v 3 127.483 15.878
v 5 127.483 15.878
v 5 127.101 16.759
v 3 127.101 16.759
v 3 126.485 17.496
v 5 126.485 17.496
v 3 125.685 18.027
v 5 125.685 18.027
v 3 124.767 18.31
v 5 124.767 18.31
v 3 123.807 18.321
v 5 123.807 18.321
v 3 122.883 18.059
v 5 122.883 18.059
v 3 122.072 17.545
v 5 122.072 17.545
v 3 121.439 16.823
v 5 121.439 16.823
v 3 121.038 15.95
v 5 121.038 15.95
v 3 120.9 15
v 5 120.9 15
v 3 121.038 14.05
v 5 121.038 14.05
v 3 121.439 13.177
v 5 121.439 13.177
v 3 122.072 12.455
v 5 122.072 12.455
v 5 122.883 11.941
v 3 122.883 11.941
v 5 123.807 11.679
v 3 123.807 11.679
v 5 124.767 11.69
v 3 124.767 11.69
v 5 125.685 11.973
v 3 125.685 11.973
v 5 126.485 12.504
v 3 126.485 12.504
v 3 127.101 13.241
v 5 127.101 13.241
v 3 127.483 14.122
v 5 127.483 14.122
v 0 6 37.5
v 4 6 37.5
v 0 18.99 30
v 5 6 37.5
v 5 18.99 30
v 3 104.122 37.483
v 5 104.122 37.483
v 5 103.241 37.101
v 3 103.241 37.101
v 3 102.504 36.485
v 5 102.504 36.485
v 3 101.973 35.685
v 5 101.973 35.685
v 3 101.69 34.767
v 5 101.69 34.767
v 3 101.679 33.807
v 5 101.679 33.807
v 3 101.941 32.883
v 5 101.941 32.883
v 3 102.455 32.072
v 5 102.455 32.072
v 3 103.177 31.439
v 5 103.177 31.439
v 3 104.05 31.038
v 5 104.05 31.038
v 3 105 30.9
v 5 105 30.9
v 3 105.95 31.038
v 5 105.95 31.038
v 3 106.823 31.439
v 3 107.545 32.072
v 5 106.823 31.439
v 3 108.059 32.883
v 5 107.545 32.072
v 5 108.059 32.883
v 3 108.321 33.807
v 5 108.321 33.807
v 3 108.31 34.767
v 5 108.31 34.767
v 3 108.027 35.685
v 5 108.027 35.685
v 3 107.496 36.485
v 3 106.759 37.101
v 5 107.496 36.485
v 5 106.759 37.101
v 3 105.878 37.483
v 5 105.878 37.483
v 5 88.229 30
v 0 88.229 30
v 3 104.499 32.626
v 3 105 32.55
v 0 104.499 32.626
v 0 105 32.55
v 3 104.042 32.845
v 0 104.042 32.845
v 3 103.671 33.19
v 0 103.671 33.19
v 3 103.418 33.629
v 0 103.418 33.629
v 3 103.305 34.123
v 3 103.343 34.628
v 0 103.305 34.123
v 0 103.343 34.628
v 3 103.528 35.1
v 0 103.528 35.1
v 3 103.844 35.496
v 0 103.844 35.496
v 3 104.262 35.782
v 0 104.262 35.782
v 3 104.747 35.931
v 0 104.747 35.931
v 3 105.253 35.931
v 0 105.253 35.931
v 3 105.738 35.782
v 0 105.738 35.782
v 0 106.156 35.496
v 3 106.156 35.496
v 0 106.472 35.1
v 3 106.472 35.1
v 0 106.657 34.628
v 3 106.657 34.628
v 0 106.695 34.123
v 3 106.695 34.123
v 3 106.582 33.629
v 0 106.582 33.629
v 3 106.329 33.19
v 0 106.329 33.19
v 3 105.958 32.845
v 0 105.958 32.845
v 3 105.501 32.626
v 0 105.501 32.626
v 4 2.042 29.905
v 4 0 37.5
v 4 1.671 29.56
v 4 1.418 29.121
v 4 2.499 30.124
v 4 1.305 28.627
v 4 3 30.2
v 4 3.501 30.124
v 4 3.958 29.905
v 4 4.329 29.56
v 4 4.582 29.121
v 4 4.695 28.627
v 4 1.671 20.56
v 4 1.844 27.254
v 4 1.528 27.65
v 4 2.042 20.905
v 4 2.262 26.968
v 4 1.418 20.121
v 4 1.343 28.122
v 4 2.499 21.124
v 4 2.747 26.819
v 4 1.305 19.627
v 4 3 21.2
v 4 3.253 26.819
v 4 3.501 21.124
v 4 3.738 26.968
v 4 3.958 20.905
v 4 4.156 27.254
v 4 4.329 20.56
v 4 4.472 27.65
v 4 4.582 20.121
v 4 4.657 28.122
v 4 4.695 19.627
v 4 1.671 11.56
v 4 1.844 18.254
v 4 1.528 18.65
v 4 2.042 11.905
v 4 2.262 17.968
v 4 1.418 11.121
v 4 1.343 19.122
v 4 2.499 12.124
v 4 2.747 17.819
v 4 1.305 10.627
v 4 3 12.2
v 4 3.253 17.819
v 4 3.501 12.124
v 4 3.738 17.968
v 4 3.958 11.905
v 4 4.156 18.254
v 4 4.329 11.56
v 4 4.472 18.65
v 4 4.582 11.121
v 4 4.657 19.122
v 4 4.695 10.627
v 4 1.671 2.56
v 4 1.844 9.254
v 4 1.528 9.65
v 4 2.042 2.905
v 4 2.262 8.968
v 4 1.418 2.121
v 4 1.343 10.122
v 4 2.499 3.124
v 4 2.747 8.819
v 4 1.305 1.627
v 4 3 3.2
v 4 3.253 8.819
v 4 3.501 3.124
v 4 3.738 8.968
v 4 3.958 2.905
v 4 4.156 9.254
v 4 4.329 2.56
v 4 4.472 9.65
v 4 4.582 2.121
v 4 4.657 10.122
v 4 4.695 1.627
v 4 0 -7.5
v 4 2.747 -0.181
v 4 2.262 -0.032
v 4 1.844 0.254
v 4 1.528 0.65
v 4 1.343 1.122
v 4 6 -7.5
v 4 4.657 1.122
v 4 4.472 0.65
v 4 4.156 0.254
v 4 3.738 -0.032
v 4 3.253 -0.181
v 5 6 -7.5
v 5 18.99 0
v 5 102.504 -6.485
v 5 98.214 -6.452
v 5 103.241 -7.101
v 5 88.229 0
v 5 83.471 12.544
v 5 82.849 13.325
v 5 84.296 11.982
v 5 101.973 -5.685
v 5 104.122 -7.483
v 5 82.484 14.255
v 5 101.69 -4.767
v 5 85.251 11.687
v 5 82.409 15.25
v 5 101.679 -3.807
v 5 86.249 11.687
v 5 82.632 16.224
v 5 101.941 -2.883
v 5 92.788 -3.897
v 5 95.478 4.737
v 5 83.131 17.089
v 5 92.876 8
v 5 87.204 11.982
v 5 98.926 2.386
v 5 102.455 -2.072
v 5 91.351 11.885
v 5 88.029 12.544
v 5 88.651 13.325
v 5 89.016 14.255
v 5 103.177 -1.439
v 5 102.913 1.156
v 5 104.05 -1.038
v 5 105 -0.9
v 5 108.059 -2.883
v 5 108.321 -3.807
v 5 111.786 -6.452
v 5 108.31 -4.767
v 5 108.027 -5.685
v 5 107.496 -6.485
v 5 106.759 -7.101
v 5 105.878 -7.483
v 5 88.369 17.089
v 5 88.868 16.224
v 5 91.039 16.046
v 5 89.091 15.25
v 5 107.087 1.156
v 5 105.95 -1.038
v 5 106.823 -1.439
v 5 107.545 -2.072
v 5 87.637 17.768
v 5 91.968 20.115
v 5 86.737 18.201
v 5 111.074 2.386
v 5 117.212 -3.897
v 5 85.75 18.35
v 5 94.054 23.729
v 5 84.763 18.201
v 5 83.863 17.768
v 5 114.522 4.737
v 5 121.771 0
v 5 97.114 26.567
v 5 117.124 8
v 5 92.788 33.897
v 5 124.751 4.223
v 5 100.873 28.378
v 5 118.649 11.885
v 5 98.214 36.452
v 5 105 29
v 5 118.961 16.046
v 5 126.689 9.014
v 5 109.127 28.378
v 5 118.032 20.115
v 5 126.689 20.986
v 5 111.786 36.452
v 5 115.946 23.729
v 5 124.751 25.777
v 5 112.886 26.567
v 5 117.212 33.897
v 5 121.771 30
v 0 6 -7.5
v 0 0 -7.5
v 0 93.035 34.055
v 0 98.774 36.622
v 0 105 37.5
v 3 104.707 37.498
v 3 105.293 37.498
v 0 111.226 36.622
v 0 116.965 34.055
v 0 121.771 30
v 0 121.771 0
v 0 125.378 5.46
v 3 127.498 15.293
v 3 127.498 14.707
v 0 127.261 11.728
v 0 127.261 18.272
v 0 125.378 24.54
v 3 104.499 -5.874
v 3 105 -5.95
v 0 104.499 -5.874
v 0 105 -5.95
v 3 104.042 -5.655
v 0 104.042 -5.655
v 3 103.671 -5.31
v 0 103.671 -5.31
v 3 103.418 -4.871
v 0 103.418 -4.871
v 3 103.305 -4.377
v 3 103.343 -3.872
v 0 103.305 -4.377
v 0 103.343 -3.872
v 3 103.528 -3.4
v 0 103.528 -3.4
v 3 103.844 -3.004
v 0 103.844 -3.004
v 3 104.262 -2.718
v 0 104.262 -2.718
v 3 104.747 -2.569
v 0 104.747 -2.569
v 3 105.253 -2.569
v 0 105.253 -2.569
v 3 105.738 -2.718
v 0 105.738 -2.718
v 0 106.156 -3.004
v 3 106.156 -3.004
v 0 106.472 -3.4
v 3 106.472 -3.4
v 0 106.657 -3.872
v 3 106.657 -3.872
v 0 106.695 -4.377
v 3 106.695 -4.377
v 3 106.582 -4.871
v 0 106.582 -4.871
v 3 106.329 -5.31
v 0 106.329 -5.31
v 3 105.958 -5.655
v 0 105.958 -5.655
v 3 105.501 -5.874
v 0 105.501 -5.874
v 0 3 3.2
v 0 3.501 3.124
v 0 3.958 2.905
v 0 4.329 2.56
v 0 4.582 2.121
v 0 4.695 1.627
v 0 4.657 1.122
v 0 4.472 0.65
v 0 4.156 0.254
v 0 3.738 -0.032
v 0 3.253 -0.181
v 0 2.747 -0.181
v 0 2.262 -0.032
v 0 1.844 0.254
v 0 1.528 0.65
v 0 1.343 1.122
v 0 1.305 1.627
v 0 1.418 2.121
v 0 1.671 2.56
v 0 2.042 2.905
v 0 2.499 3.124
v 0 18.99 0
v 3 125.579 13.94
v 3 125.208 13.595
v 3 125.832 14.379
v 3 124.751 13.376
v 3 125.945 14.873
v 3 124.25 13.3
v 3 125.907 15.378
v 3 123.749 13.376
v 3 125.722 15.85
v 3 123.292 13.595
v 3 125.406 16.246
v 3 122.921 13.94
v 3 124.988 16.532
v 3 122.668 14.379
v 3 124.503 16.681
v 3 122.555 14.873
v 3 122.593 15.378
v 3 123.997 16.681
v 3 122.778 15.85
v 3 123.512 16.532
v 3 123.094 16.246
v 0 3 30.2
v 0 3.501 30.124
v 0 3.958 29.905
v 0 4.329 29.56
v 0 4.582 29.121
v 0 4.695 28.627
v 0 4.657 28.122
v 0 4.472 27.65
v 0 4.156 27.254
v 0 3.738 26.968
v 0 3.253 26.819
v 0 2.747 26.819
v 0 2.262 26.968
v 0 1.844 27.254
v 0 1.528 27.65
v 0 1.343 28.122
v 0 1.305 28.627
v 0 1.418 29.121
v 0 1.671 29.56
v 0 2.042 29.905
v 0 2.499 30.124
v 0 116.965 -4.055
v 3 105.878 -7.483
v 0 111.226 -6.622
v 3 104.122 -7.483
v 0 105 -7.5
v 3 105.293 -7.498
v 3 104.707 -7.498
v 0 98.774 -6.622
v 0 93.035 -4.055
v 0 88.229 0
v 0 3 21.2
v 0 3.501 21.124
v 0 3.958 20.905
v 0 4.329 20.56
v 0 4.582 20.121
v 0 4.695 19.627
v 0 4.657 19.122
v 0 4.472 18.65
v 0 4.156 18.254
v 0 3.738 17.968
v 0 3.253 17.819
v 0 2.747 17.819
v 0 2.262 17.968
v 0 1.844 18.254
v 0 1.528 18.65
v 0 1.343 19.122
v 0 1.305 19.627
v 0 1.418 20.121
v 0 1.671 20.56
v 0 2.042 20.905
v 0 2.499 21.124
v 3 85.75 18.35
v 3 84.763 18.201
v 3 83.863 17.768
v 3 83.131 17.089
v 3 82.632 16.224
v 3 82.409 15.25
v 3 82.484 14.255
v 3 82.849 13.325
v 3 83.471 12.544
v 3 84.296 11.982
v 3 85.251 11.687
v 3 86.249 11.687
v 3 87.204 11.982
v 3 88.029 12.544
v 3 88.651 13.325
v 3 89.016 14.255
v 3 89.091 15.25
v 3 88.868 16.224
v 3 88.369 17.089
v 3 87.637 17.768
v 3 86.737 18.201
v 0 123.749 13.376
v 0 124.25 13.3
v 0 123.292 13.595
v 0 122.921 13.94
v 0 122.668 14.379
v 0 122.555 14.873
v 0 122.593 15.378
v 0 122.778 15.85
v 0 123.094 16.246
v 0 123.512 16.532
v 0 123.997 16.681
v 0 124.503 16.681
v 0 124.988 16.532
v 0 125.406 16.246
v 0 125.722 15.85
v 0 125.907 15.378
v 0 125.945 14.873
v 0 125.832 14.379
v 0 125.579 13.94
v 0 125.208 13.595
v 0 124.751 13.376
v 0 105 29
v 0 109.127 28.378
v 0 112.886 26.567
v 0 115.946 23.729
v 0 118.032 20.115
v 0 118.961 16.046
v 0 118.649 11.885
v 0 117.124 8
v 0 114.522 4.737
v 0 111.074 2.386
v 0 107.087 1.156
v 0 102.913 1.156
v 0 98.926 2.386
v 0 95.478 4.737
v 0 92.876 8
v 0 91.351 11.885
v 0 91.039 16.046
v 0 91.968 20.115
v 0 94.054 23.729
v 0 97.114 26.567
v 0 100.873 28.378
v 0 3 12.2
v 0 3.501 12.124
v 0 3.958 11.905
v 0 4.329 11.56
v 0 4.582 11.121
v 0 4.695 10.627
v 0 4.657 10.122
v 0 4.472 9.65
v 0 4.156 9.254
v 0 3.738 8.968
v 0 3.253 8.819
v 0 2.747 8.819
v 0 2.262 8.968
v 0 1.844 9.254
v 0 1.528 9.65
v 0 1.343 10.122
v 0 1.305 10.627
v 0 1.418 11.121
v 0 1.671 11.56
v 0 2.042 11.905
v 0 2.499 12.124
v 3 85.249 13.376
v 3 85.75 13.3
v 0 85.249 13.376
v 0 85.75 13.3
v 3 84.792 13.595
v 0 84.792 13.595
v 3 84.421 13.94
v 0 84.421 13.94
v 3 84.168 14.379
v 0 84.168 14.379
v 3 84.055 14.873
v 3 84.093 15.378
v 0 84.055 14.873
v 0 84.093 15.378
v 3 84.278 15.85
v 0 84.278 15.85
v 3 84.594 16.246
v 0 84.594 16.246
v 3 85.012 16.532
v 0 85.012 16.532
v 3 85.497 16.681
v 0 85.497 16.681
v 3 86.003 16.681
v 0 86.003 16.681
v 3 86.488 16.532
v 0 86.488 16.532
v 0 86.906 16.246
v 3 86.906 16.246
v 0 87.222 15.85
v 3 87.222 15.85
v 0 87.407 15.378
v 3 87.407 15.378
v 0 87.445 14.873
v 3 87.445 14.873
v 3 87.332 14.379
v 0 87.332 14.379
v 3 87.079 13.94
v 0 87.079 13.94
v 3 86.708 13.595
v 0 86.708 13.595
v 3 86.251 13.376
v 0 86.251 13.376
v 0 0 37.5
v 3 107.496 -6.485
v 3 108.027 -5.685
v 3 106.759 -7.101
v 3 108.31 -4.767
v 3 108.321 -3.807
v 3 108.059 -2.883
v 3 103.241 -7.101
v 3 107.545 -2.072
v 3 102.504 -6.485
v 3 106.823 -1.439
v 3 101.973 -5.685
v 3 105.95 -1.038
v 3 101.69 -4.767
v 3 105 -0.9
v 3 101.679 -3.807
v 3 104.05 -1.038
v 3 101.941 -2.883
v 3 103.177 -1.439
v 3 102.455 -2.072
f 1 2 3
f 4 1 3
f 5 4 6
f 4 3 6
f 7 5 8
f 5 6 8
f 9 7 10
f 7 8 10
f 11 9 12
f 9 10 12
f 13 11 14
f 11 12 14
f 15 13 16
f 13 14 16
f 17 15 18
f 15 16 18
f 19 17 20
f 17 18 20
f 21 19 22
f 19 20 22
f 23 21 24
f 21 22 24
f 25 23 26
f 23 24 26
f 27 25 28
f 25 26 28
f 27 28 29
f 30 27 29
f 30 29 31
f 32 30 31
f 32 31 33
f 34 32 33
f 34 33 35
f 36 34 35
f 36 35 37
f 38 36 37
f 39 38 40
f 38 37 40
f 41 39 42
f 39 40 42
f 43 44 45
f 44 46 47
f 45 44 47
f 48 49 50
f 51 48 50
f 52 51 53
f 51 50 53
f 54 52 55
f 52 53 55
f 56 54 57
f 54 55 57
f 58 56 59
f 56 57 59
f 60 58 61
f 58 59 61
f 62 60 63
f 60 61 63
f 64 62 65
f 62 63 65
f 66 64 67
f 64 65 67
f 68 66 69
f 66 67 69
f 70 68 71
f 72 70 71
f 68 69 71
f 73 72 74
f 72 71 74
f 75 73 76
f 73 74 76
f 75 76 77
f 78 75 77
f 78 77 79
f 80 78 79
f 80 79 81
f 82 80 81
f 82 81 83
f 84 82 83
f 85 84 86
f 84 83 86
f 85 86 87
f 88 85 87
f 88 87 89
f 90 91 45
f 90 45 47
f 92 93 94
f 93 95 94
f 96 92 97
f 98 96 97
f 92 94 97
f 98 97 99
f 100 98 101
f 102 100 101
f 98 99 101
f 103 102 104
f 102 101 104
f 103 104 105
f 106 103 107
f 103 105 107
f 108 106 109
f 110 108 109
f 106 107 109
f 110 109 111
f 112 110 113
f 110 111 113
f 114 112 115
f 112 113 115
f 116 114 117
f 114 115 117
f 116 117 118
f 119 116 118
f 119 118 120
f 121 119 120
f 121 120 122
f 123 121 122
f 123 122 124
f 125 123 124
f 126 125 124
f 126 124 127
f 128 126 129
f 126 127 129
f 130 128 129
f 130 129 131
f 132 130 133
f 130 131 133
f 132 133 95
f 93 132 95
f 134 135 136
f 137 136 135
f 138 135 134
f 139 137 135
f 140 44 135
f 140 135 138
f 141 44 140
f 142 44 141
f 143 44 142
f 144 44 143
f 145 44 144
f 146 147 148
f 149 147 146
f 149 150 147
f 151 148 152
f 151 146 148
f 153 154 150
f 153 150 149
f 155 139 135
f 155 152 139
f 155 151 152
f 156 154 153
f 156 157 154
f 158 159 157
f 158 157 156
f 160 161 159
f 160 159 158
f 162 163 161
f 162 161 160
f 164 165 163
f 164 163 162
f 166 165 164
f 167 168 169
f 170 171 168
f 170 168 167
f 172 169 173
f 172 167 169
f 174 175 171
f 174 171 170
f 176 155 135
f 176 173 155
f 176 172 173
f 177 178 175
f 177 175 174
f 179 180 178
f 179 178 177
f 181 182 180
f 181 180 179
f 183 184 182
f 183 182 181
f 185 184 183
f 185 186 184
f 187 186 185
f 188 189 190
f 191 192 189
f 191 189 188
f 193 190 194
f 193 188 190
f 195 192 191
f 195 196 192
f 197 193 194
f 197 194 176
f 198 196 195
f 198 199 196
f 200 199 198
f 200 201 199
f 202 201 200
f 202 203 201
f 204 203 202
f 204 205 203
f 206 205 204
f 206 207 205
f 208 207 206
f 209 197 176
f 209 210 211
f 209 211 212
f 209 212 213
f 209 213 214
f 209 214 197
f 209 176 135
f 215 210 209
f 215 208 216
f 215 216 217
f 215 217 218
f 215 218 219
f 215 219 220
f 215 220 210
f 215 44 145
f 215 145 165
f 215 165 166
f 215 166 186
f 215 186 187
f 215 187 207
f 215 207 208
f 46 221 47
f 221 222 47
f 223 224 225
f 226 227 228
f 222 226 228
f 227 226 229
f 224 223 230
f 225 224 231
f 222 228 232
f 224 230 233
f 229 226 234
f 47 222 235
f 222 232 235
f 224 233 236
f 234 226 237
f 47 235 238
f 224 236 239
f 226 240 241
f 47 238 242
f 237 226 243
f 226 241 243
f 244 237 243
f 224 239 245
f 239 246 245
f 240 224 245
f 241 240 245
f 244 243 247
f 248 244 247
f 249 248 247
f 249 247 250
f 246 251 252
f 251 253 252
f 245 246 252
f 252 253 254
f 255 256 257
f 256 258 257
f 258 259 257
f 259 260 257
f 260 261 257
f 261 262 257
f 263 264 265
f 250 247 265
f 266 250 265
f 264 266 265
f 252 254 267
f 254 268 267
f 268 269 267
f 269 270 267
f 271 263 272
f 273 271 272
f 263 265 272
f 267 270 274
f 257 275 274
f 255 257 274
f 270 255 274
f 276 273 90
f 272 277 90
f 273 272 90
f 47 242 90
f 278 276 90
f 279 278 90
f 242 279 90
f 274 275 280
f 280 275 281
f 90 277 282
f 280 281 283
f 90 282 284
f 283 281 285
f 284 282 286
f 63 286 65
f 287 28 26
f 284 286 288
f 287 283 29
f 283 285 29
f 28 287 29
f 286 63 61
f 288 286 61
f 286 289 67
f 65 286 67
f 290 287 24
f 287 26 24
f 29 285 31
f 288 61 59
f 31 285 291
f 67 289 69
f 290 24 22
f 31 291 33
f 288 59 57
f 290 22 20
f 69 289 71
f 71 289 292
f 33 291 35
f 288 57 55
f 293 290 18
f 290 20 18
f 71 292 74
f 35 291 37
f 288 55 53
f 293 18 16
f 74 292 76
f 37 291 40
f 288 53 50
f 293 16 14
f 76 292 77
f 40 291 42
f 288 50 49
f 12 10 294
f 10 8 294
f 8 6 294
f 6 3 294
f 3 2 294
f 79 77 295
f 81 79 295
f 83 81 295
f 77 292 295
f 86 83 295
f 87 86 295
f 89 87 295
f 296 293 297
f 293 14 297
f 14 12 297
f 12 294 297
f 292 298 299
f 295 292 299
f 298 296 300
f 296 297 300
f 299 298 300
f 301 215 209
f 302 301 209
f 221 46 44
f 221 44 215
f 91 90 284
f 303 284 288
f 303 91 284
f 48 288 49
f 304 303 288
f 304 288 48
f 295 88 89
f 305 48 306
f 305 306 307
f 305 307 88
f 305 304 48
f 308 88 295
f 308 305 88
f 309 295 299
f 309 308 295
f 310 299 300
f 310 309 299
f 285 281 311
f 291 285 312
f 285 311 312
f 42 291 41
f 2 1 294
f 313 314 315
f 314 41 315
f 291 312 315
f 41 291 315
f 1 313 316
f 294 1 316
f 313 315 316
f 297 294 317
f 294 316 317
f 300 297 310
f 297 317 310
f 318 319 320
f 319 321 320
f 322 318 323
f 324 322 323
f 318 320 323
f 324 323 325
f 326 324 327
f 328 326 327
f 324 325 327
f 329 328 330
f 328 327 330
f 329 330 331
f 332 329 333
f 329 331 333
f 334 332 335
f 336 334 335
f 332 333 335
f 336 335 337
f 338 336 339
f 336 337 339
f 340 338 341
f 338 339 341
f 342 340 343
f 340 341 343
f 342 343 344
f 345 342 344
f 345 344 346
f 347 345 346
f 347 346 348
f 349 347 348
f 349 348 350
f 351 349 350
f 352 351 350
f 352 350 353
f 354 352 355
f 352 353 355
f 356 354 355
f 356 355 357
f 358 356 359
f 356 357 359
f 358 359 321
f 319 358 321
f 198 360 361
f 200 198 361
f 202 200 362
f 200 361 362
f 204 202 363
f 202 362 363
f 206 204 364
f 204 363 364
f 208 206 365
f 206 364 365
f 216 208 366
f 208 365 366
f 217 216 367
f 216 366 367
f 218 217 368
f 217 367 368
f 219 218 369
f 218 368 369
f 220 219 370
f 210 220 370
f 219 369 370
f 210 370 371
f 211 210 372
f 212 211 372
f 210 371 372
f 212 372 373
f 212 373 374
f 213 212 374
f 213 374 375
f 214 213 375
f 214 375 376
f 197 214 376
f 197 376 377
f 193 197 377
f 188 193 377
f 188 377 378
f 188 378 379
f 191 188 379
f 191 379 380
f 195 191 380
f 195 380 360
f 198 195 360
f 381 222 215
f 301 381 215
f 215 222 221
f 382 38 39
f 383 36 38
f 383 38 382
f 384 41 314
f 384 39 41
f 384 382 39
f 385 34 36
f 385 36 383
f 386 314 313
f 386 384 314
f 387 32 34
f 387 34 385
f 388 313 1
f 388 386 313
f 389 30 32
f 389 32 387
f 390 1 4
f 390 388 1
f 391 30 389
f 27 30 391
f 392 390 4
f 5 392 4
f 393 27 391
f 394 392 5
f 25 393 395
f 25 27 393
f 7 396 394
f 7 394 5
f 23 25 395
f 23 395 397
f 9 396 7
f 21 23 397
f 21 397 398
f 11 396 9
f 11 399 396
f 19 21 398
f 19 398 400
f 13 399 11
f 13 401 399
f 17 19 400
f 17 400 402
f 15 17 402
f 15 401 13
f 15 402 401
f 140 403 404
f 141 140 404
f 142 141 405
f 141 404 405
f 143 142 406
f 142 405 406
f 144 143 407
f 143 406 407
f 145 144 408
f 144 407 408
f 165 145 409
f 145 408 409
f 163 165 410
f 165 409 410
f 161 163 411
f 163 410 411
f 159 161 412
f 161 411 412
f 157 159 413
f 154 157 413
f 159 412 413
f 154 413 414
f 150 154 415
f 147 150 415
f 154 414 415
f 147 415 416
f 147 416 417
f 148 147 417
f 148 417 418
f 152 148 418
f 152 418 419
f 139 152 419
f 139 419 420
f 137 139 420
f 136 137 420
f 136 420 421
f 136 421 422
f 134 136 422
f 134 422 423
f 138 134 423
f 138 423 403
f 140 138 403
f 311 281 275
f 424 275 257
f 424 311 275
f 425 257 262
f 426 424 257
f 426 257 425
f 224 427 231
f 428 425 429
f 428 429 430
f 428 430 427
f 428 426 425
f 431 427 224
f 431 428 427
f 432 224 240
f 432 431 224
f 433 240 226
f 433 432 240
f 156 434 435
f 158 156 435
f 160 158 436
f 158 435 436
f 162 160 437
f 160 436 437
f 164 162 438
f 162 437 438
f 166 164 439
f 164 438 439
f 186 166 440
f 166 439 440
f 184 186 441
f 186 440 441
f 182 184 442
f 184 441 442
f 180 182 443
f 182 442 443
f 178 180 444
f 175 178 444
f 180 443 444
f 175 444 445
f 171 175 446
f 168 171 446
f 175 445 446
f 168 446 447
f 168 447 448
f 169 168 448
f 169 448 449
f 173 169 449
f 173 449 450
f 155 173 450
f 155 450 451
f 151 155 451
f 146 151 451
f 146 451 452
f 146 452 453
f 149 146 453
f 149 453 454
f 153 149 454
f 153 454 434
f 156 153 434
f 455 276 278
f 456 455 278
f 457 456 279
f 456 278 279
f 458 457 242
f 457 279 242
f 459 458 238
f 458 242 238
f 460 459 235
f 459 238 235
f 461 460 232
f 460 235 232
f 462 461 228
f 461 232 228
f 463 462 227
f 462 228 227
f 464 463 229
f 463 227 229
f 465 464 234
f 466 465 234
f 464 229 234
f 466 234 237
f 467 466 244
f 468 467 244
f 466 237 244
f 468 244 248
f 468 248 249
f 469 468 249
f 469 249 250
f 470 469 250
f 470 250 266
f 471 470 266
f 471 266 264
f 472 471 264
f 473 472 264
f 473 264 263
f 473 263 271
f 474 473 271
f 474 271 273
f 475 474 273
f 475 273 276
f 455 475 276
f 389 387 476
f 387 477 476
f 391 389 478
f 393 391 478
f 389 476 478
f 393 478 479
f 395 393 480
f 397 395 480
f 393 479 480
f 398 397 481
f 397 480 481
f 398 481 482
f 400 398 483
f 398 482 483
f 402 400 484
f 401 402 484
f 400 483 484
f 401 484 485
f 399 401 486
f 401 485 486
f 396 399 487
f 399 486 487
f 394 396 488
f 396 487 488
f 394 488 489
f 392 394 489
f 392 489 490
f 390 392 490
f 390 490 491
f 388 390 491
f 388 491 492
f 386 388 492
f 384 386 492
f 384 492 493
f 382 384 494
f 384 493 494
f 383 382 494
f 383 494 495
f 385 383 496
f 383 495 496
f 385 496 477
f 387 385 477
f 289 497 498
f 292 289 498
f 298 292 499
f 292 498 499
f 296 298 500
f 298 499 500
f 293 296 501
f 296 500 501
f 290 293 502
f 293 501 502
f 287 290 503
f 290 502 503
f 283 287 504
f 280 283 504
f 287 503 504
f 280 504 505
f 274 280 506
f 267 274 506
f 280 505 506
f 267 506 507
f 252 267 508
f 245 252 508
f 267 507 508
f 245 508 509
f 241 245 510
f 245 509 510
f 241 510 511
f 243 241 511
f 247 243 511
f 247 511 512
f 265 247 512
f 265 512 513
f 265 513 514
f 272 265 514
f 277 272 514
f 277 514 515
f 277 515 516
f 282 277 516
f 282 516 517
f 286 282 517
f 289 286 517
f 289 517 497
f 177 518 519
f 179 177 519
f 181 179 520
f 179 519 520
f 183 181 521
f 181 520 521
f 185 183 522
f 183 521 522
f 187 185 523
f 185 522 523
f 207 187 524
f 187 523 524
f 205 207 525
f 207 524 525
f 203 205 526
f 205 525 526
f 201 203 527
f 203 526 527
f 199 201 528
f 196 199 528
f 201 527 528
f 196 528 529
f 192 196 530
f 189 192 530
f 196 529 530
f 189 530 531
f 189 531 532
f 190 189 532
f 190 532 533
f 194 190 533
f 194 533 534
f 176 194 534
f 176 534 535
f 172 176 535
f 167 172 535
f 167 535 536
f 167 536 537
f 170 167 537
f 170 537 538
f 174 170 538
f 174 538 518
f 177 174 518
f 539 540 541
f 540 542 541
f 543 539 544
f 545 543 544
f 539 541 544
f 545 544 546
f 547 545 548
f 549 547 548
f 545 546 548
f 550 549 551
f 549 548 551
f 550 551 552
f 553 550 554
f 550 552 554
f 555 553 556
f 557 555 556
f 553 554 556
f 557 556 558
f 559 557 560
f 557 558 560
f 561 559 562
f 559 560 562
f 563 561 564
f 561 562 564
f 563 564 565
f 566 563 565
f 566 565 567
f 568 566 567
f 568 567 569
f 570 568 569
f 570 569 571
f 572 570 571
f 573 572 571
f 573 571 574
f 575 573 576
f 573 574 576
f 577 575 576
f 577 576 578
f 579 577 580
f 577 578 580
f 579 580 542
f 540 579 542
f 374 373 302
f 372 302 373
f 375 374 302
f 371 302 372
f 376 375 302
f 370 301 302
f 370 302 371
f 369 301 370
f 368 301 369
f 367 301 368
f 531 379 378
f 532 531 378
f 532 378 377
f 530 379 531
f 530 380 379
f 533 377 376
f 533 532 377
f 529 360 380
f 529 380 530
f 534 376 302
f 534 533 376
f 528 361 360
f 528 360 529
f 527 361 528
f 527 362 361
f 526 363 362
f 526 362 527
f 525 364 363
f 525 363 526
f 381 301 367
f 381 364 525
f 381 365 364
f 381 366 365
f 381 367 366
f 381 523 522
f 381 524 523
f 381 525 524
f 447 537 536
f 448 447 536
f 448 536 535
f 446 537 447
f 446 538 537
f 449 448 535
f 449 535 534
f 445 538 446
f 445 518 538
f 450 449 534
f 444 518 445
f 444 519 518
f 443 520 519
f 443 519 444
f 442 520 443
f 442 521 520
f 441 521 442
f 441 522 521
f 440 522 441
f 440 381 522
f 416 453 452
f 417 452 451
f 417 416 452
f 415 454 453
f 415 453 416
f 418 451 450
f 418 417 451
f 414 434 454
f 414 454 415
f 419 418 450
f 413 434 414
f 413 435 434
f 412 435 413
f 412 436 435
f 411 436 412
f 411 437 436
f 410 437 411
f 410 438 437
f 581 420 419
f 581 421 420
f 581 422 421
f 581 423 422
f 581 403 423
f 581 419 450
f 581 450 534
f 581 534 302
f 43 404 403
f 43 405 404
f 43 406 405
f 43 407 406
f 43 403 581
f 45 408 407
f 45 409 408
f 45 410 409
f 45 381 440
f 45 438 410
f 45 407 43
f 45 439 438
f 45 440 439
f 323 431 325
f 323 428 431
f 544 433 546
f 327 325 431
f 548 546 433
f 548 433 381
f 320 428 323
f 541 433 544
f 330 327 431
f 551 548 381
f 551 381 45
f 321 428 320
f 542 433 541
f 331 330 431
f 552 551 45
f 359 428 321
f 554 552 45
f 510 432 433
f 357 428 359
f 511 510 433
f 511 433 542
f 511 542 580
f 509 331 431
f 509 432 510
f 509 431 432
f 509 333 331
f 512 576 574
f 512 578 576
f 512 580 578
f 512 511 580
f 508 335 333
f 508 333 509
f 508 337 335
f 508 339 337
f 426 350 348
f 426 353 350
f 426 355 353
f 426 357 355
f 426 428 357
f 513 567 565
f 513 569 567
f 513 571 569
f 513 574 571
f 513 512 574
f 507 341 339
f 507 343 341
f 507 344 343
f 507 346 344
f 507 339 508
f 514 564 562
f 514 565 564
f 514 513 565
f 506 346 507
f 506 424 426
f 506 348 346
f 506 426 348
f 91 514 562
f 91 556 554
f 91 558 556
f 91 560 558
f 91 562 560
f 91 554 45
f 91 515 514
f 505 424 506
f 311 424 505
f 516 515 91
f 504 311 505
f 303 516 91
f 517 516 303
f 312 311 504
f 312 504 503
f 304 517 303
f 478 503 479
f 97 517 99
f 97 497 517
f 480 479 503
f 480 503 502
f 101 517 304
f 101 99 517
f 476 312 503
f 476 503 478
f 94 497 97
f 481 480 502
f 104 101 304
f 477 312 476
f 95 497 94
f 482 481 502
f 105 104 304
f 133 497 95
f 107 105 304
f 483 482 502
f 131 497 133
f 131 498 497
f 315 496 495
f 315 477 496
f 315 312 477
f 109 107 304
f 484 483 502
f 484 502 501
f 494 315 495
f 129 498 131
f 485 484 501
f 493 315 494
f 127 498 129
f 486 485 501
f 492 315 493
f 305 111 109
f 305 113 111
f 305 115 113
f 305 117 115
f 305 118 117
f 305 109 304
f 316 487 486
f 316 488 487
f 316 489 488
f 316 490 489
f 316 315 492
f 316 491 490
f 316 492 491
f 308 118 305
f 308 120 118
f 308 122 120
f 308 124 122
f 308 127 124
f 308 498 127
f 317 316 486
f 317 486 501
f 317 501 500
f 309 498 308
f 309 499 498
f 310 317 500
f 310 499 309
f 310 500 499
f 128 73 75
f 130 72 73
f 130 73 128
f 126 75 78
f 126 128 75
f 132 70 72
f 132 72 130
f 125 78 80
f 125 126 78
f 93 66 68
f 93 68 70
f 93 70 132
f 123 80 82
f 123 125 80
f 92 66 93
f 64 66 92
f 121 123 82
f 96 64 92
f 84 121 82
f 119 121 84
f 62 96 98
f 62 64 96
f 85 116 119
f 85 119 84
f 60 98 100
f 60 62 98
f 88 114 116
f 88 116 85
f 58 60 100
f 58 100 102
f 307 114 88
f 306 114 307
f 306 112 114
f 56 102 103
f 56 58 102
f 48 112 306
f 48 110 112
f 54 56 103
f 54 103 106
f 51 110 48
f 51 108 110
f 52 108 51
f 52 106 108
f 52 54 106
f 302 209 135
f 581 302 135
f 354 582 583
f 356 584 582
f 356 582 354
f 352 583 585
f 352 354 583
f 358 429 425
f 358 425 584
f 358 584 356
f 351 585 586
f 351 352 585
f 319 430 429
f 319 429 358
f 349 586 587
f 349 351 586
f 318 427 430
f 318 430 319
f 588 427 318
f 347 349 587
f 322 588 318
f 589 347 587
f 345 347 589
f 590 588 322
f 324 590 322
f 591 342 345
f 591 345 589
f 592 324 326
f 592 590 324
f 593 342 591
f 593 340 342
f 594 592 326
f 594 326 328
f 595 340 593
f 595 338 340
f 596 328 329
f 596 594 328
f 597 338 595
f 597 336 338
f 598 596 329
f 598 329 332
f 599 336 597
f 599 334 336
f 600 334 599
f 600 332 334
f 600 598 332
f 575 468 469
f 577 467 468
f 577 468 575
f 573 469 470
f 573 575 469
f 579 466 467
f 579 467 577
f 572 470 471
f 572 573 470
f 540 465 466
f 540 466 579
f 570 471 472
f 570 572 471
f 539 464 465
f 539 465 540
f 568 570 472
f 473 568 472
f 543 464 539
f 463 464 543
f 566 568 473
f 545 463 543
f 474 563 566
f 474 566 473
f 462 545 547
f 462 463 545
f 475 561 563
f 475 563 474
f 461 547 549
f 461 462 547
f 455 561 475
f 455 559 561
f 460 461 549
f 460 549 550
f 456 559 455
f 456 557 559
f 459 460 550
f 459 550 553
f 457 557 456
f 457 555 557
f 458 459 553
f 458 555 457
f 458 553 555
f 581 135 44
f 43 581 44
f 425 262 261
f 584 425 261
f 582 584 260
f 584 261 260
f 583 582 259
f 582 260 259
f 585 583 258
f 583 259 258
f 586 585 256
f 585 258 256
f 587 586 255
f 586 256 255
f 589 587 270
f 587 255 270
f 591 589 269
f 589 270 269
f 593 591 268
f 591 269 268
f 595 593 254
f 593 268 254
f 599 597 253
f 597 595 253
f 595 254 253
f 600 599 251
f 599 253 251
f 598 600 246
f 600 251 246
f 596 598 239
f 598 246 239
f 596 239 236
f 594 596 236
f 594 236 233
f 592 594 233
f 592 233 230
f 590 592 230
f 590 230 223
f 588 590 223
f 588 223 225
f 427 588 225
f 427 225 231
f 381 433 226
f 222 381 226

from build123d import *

# Parameters (mm, degrees)
SKETCH_1_W                  = 5
SKETCH_1_H                  = 30
EXTRUDE_1_DEPTH             = 227
SKETCH_2_R                  = 22.5
EXTRUDE_2_DEPTH             = 5
SKETCH_3_R                  = 14
CUT_EXTRUDE_1_DEPTH         = 231.130940988
HOLE_WIZARD_M31_D           = 3.4
HOLE_WIZARD_M31_CBORE_D     = 6.7
HOLE_WIZARD_M31_CBORE_DEPTH = 2
EXTRUDE_3_DEPTH             = 5
HOLE_WIZARD_M31_2_D         = 3.4
SKETCH_14_W                 = 45
SKETCH_14_H                 = 6
CUT_EXTRUDE_2_DEPTH         = 1
CUT_EXTRUDE_START           = -5
CUT_EXTRUDE_3_DEPTH         = 5


with BuildPart() as part:
    # Эскиз1 → Бобышка-Вытянуть1 (new body)
    with BuildSketch(Plane(origin=(0, 0, 0), x_dir=(1, 0, 0), z_dir=(0, 1, 0))):
        with Locations((2.5, -15)):
            Rectangle(SKETCH_1_W, SKETCH_1_H)
    extrude(amount=EXTRUDE_1_DEPTH)

    # Эскиз2 → Бобышка-Вытянуть2 (add)
    with BuildSketch(Plane.ZY):
        with Locations((15, 105)):
            Circle(SKETCH_2_R)
    extrude(amount=-EXTRUDE_2_DEPTH)

    # Эскиз3 → Вырез-Вытянуть1 (cut, through all)
    with BuildSketch(Plane.ZY):
        with Locations((15, 105)):
            Circle(SKETCH_3_R)
    extrude(amount=-CUT_EXTRUDE_1_DEPTH, mode=Mode.SUBTRACT)

    # Hole Wizard M31 (through all)
    with Locations(Plane(origin=(5, -25.024735225, 7.262908886), x_dir=(0, 0, 1), z_dir=(1, 0, 0))):
        with Locations((7.737091114, -149.274735225), (-11.512908886, -130.024735225), (7.737091114, -110.774735225), (26.987091114, -130.024735225)):
            CounterBoreHole(HOLE_WIZARD_M31_D / 2, HOLE_WIZARD_M31_CBORE_D / 2, HOLE_WIZARD_M31_CBORE_DEPTH)

    # Эскиз11 → Бобышка-Вытянуть3 (add)
    with BuildSketch(Plane(origin=(5, 0, 0), x_dir=(0, 0, -1), z_dir=(1, 0, 0))):
        Polygon((0, 18.990381057), (7.5, 6), (7.5, 0), (-37.5, 0), (-37.5, 6), (-30, 18.990381057), align=None)
    extrude(amount=-EXTRUDE_3_DEPTH)

    # Hole Wizard M31 2 (through all)
    with Locations(Plane(origin=(5, 0, 0), x_dir=(0, 0, -1), z_dir=(1, 0, 0))):
        with Locations((-28.5, 3), (-19.5, 3), (-10.5, 3), (-1.5, 3)):
            Hole(HOLE_WIZARD_M31_2_D / 2)

    # Эскиз14 → Вырез-Вытянуть2 (cut)
    with BuildSketch(Plane(origin=(5, 0, 0), x_dir=(0, 0, -1), z_dir=(1, 0, 0))):
        with Locations((-15, 3)):
            Rectangle(SKETCH_14_W, SKETCH_14_H)
    extrude(amount=-CUT_EXTRUDE_2_DEPTH, mode=Mode.SUBTRACT)

    # Эскиз15 → Вырез-Вытянуть3 (cut)
    with BuildSketch(Plane(origin=(5, 0, 0), x_dir=(0, 0, -1), z_dir=(1, 0, 0)).offset(CUT_EXTRUDE_START)):
        with BuildLine():
            Line((-30, 227), (0, 227))
            Line((0, 227), (0, 121.770509831))
            ThreePointArc((0, 121.770509831), (-15, 127.5), (-30, 121.770509831))
            Line((-30, 121.770509831), (-30, 227))
        make_face()
    extrude(amount=CUT_EXTRUDE_3_DEPTH, mode=Mode.SUBTRACT)


solid = part.part
